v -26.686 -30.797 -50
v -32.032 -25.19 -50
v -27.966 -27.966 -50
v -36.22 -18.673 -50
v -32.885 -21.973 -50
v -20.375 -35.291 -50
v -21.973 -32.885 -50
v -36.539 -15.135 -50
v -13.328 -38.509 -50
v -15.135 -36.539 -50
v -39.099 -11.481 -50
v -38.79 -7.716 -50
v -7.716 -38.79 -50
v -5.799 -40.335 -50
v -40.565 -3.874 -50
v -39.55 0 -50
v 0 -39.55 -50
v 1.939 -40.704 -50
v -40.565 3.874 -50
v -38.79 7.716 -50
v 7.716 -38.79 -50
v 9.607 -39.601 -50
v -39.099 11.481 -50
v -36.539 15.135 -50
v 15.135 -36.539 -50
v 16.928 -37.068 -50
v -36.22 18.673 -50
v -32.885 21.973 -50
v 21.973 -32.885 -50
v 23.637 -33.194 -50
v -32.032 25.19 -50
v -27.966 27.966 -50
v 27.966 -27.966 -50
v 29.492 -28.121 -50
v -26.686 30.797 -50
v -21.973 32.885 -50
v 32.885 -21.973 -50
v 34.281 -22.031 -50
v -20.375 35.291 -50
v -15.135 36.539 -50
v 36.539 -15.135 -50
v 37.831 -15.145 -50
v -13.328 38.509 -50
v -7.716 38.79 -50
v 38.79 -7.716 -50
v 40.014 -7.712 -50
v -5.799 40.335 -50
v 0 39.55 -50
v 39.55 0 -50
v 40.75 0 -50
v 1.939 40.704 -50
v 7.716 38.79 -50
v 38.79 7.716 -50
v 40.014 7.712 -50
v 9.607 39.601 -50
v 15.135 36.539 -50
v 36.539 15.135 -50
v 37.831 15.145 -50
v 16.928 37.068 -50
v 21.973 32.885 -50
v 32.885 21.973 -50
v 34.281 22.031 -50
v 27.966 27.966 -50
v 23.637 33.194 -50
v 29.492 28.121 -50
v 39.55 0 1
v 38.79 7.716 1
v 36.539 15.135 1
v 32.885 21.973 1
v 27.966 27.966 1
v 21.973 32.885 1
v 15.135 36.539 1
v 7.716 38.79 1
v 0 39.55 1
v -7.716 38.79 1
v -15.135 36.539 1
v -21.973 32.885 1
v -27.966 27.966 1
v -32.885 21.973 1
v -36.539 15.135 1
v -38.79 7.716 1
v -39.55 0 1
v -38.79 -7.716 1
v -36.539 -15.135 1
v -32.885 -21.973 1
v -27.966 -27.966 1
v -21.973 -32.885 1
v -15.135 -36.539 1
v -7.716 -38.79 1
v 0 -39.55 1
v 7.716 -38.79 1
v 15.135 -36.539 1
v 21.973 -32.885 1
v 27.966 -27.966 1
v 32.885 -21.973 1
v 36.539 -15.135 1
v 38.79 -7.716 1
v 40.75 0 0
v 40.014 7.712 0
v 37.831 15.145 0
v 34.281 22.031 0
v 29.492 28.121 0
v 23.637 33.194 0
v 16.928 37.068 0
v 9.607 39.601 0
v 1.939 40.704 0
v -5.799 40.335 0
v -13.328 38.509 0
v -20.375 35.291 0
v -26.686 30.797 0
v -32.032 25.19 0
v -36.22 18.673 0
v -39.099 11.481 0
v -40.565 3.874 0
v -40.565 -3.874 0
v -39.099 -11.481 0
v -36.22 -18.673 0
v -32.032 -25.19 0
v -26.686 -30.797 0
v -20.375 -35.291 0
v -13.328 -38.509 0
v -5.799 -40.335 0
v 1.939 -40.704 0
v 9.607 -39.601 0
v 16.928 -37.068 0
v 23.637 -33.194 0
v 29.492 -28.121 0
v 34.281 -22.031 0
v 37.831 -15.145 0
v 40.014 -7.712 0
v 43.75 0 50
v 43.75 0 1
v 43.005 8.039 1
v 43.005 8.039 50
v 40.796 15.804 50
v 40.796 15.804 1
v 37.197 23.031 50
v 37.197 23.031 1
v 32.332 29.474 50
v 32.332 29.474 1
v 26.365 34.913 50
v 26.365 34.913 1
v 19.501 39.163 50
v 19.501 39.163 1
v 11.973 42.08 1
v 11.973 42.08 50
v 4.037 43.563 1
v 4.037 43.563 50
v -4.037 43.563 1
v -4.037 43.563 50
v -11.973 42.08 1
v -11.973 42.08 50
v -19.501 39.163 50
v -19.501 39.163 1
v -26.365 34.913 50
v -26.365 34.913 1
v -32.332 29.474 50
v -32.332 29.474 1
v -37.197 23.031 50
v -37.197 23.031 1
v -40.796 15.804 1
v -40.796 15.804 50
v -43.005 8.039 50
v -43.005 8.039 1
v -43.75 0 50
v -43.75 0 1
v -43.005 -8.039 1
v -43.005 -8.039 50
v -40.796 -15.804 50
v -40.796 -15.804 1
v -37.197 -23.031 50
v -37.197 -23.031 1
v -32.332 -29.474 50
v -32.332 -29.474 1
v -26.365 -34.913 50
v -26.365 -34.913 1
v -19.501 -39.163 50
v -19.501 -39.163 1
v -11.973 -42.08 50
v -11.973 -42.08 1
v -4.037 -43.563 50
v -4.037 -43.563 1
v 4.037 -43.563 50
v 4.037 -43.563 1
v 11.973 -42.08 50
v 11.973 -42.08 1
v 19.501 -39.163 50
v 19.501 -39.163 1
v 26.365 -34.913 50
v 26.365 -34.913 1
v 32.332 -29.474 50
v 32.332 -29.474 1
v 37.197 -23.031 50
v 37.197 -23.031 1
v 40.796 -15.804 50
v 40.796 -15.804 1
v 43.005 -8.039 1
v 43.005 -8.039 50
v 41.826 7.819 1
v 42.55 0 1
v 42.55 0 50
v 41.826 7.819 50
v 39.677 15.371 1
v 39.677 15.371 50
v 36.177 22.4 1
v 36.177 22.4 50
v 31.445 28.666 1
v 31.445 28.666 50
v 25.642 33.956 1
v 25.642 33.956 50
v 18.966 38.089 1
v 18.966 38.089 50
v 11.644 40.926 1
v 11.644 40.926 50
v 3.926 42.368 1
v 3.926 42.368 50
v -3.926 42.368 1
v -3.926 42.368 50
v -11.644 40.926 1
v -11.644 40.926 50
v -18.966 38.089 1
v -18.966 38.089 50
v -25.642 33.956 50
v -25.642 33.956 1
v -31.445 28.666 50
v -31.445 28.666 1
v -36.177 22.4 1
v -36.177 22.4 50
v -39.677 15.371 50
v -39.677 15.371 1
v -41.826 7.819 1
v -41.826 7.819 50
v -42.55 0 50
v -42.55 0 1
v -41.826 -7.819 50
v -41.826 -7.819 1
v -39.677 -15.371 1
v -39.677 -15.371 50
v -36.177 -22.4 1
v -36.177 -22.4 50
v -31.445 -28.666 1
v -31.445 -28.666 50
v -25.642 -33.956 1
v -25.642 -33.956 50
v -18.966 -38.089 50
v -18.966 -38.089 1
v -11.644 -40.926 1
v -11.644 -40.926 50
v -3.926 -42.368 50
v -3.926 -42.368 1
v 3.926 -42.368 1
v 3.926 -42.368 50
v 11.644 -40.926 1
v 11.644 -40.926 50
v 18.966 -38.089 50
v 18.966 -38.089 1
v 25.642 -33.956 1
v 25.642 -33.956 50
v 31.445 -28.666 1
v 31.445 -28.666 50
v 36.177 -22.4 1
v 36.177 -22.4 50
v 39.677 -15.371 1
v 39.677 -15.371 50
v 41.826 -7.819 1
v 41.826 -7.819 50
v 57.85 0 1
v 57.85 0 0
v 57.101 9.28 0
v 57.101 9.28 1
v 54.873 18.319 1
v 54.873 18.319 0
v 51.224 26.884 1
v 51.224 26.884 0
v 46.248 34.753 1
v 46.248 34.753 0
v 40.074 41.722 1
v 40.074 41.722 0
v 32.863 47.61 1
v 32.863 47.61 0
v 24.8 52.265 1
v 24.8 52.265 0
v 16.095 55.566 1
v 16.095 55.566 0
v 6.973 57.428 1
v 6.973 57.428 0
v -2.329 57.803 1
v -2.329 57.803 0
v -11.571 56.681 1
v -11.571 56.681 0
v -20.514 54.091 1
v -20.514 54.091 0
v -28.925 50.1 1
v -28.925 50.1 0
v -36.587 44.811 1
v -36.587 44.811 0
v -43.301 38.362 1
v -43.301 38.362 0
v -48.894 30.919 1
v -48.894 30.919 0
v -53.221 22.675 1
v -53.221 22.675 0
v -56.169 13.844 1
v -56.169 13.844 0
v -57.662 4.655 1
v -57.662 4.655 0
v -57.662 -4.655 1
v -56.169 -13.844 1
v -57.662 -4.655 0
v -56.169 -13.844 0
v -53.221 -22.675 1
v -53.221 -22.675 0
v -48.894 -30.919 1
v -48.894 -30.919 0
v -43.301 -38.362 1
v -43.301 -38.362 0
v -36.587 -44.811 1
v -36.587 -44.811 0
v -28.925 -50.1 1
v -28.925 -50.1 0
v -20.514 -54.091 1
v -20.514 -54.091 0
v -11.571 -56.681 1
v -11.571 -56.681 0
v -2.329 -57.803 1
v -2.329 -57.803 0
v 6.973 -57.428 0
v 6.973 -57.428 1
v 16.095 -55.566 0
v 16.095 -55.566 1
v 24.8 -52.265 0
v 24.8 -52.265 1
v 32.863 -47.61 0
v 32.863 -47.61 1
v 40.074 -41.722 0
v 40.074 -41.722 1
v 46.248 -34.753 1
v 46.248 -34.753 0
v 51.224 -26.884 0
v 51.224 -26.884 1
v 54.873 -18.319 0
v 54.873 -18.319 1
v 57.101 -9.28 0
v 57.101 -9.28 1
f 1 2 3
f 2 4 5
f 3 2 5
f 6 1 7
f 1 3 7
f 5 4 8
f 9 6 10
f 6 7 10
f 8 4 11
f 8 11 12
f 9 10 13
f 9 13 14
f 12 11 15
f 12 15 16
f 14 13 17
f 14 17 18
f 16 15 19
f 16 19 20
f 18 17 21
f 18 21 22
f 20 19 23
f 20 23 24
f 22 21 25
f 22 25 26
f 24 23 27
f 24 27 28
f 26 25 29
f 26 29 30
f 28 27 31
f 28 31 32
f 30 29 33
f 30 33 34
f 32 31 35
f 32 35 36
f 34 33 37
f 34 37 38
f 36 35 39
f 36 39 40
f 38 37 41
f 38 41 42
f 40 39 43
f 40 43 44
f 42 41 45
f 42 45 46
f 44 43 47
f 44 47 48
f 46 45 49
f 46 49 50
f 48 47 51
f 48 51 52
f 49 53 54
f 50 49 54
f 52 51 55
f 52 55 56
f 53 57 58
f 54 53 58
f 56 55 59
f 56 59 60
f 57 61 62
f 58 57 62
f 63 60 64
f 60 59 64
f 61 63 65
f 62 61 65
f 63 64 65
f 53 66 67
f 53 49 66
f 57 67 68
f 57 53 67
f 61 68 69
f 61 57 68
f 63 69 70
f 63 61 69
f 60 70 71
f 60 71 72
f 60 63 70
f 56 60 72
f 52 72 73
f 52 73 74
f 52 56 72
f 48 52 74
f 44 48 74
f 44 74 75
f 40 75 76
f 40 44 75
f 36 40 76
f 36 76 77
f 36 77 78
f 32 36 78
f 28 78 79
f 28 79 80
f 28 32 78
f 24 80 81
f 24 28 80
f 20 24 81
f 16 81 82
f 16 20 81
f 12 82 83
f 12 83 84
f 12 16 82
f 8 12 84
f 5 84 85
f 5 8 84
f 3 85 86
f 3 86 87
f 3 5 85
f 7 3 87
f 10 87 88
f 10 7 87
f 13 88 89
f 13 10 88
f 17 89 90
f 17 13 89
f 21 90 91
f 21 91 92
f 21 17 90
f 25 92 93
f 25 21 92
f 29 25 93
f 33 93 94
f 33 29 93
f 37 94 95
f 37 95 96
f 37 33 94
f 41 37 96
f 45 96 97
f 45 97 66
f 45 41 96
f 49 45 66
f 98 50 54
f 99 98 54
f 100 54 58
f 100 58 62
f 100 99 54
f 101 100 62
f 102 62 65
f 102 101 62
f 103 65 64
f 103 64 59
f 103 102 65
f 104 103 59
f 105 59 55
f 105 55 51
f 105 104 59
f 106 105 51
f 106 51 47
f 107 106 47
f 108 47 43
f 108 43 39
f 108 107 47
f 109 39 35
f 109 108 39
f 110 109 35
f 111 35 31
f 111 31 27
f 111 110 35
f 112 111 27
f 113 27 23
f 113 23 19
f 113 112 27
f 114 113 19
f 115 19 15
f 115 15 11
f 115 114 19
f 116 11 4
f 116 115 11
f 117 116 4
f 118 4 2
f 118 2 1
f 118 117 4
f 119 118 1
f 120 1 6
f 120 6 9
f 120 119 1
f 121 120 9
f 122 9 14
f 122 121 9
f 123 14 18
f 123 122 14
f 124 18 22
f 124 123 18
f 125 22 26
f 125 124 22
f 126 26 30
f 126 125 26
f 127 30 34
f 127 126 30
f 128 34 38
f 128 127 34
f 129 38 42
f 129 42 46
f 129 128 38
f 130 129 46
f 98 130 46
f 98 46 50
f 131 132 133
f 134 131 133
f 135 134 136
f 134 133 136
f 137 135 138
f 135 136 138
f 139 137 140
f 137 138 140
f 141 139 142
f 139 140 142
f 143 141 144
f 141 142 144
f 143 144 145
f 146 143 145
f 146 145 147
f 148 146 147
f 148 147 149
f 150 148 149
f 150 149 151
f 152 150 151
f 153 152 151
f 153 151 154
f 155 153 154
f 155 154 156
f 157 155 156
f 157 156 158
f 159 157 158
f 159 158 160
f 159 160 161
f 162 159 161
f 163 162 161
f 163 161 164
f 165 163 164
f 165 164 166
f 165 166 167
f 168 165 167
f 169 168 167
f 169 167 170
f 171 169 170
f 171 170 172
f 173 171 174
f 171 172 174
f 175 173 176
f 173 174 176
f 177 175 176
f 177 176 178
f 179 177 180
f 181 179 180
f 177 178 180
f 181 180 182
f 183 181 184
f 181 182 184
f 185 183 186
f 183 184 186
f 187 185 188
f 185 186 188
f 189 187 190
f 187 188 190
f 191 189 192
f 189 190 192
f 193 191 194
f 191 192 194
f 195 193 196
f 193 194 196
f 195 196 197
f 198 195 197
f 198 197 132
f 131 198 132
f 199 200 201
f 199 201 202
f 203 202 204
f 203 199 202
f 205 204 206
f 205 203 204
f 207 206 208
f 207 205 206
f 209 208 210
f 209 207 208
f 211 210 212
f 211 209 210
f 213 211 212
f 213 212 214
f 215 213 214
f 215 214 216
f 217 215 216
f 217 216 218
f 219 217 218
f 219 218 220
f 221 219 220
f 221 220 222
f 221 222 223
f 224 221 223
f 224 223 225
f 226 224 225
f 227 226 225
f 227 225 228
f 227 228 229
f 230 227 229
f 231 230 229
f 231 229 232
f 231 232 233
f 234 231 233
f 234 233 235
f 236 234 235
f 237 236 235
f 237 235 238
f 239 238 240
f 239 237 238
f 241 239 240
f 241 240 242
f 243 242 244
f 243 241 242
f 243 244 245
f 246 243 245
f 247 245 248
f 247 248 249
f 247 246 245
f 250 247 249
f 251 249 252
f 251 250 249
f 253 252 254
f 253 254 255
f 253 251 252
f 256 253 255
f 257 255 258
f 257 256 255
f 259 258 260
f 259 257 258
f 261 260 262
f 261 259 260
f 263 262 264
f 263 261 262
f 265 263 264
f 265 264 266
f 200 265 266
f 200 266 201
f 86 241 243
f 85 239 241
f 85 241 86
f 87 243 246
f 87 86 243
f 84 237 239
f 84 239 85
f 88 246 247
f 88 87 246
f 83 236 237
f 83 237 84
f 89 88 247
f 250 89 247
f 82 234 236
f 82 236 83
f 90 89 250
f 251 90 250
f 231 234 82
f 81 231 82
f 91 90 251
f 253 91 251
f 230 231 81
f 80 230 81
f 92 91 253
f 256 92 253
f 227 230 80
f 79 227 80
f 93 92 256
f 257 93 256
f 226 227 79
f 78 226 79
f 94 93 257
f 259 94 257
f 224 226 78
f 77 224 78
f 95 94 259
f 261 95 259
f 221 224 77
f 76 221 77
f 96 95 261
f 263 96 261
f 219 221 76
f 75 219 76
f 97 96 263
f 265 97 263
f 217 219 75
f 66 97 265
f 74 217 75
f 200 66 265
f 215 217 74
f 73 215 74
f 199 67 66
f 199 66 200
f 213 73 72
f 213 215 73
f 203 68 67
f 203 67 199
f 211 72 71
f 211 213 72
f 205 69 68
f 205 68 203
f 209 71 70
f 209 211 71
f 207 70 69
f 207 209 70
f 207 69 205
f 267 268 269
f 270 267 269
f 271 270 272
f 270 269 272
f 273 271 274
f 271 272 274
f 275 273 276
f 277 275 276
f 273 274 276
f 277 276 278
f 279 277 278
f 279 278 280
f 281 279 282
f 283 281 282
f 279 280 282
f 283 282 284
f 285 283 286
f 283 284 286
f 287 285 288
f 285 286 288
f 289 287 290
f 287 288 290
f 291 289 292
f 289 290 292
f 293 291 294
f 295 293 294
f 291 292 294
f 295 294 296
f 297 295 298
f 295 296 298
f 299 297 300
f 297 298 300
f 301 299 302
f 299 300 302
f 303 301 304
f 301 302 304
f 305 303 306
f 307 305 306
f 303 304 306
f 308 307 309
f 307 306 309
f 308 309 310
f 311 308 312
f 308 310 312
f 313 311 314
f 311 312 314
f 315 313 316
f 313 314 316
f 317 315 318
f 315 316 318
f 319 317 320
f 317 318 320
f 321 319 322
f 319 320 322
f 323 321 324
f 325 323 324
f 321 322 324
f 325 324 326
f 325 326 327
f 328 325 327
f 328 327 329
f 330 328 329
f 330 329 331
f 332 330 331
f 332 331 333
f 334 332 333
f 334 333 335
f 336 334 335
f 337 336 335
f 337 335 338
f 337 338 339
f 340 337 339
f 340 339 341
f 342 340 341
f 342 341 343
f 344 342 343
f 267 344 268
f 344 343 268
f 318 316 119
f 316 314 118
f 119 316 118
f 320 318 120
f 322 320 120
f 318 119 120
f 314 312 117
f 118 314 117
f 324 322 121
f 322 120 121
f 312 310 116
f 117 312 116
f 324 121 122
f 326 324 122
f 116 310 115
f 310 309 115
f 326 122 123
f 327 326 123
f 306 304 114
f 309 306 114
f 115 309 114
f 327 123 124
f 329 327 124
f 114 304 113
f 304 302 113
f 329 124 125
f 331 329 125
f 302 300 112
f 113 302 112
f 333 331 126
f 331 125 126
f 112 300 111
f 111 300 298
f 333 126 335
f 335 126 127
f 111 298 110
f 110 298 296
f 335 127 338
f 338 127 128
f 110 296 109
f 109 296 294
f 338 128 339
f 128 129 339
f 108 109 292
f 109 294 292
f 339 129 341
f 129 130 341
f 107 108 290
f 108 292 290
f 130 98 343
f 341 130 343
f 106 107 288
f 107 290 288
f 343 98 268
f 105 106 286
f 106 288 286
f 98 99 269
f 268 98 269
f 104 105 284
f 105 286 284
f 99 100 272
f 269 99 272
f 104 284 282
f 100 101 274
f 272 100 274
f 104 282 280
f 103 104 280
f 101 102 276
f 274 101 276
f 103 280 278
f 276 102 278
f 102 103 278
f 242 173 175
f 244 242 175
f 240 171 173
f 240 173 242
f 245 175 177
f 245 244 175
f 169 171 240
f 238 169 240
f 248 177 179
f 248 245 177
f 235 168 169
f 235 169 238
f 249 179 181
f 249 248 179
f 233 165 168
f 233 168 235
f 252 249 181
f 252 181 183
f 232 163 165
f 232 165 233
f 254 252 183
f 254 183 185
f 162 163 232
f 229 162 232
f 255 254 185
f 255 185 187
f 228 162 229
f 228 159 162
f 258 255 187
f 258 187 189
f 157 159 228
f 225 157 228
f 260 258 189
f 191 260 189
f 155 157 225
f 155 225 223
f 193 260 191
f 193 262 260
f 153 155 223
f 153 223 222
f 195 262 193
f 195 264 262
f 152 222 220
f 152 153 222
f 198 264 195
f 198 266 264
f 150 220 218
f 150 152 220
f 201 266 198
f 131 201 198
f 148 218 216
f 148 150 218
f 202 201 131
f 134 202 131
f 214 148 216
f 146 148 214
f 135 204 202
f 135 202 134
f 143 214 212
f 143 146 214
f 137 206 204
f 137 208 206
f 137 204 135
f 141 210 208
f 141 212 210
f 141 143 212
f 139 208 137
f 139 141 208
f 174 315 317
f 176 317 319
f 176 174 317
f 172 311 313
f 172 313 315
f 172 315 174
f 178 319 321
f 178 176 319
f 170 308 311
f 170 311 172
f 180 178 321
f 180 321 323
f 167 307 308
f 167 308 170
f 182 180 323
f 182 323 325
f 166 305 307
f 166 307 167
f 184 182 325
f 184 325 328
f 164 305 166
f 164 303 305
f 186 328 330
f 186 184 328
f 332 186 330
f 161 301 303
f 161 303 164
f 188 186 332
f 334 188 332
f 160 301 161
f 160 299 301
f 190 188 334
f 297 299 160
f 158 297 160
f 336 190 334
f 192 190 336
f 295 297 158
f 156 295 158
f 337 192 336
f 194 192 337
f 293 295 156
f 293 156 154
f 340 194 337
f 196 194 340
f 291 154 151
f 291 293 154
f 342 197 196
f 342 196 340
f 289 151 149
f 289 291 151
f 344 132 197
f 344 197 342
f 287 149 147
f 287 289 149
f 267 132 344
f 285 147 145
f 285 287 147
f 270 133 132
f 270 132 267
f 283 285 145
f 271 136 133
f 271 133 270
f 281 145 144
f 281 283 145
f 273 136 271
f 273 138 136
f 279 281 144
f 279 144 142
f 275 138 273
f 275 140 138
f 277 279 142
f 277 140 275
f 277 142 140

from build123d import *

# Parameters (mm, degrees)
F0_R     = 40.75
F0_R_2   = 39.55
F1_DEPTH = 50
F0_R_3   = 57.8499995172
F0_R_4   = 43.75
F0_R_5   = 42.55
F2_DEPTH = 1
F3_DEPTH = 50


with BuildPart() as f1:
    # F0 (on Top) → F1 (new body)
    with BuildSketch(Plane.XY):
        Circle(F0_R)
        Circle(F0_R_2, mode=Mode.SUBTRACT)
    extrude(amount=-F1_DEPTH)

    # F0 (on Top) → F2 (join)
    with BuildSketch(Plane.XY):
        Circle(F0_R_3)
        Circle(F0_R_4, mode=Mode.SUBTRACT)
        Circle(F0_R_4)
        Circle(F0_R_5, mode=Mode.SUBTRACT)
        Circle(F0_R_5)
        Circle(F0_R, mode=Mode.SUBTRACT)
        Circle(F0_R)
        Circle(F0_R_2, mode=Mode.SUBTRACT)
    extrude(amount=F2_DEPTH)

    # F0 (on Top) → F3 (join)
    with BuildSketch(Plane.XY):
        Circle(F0_R_4)
        Circle(F0_R_5, mode=Mode.SUBTRACT)
    extrude(amount=F3_DEPTH)


solid = f1.part
